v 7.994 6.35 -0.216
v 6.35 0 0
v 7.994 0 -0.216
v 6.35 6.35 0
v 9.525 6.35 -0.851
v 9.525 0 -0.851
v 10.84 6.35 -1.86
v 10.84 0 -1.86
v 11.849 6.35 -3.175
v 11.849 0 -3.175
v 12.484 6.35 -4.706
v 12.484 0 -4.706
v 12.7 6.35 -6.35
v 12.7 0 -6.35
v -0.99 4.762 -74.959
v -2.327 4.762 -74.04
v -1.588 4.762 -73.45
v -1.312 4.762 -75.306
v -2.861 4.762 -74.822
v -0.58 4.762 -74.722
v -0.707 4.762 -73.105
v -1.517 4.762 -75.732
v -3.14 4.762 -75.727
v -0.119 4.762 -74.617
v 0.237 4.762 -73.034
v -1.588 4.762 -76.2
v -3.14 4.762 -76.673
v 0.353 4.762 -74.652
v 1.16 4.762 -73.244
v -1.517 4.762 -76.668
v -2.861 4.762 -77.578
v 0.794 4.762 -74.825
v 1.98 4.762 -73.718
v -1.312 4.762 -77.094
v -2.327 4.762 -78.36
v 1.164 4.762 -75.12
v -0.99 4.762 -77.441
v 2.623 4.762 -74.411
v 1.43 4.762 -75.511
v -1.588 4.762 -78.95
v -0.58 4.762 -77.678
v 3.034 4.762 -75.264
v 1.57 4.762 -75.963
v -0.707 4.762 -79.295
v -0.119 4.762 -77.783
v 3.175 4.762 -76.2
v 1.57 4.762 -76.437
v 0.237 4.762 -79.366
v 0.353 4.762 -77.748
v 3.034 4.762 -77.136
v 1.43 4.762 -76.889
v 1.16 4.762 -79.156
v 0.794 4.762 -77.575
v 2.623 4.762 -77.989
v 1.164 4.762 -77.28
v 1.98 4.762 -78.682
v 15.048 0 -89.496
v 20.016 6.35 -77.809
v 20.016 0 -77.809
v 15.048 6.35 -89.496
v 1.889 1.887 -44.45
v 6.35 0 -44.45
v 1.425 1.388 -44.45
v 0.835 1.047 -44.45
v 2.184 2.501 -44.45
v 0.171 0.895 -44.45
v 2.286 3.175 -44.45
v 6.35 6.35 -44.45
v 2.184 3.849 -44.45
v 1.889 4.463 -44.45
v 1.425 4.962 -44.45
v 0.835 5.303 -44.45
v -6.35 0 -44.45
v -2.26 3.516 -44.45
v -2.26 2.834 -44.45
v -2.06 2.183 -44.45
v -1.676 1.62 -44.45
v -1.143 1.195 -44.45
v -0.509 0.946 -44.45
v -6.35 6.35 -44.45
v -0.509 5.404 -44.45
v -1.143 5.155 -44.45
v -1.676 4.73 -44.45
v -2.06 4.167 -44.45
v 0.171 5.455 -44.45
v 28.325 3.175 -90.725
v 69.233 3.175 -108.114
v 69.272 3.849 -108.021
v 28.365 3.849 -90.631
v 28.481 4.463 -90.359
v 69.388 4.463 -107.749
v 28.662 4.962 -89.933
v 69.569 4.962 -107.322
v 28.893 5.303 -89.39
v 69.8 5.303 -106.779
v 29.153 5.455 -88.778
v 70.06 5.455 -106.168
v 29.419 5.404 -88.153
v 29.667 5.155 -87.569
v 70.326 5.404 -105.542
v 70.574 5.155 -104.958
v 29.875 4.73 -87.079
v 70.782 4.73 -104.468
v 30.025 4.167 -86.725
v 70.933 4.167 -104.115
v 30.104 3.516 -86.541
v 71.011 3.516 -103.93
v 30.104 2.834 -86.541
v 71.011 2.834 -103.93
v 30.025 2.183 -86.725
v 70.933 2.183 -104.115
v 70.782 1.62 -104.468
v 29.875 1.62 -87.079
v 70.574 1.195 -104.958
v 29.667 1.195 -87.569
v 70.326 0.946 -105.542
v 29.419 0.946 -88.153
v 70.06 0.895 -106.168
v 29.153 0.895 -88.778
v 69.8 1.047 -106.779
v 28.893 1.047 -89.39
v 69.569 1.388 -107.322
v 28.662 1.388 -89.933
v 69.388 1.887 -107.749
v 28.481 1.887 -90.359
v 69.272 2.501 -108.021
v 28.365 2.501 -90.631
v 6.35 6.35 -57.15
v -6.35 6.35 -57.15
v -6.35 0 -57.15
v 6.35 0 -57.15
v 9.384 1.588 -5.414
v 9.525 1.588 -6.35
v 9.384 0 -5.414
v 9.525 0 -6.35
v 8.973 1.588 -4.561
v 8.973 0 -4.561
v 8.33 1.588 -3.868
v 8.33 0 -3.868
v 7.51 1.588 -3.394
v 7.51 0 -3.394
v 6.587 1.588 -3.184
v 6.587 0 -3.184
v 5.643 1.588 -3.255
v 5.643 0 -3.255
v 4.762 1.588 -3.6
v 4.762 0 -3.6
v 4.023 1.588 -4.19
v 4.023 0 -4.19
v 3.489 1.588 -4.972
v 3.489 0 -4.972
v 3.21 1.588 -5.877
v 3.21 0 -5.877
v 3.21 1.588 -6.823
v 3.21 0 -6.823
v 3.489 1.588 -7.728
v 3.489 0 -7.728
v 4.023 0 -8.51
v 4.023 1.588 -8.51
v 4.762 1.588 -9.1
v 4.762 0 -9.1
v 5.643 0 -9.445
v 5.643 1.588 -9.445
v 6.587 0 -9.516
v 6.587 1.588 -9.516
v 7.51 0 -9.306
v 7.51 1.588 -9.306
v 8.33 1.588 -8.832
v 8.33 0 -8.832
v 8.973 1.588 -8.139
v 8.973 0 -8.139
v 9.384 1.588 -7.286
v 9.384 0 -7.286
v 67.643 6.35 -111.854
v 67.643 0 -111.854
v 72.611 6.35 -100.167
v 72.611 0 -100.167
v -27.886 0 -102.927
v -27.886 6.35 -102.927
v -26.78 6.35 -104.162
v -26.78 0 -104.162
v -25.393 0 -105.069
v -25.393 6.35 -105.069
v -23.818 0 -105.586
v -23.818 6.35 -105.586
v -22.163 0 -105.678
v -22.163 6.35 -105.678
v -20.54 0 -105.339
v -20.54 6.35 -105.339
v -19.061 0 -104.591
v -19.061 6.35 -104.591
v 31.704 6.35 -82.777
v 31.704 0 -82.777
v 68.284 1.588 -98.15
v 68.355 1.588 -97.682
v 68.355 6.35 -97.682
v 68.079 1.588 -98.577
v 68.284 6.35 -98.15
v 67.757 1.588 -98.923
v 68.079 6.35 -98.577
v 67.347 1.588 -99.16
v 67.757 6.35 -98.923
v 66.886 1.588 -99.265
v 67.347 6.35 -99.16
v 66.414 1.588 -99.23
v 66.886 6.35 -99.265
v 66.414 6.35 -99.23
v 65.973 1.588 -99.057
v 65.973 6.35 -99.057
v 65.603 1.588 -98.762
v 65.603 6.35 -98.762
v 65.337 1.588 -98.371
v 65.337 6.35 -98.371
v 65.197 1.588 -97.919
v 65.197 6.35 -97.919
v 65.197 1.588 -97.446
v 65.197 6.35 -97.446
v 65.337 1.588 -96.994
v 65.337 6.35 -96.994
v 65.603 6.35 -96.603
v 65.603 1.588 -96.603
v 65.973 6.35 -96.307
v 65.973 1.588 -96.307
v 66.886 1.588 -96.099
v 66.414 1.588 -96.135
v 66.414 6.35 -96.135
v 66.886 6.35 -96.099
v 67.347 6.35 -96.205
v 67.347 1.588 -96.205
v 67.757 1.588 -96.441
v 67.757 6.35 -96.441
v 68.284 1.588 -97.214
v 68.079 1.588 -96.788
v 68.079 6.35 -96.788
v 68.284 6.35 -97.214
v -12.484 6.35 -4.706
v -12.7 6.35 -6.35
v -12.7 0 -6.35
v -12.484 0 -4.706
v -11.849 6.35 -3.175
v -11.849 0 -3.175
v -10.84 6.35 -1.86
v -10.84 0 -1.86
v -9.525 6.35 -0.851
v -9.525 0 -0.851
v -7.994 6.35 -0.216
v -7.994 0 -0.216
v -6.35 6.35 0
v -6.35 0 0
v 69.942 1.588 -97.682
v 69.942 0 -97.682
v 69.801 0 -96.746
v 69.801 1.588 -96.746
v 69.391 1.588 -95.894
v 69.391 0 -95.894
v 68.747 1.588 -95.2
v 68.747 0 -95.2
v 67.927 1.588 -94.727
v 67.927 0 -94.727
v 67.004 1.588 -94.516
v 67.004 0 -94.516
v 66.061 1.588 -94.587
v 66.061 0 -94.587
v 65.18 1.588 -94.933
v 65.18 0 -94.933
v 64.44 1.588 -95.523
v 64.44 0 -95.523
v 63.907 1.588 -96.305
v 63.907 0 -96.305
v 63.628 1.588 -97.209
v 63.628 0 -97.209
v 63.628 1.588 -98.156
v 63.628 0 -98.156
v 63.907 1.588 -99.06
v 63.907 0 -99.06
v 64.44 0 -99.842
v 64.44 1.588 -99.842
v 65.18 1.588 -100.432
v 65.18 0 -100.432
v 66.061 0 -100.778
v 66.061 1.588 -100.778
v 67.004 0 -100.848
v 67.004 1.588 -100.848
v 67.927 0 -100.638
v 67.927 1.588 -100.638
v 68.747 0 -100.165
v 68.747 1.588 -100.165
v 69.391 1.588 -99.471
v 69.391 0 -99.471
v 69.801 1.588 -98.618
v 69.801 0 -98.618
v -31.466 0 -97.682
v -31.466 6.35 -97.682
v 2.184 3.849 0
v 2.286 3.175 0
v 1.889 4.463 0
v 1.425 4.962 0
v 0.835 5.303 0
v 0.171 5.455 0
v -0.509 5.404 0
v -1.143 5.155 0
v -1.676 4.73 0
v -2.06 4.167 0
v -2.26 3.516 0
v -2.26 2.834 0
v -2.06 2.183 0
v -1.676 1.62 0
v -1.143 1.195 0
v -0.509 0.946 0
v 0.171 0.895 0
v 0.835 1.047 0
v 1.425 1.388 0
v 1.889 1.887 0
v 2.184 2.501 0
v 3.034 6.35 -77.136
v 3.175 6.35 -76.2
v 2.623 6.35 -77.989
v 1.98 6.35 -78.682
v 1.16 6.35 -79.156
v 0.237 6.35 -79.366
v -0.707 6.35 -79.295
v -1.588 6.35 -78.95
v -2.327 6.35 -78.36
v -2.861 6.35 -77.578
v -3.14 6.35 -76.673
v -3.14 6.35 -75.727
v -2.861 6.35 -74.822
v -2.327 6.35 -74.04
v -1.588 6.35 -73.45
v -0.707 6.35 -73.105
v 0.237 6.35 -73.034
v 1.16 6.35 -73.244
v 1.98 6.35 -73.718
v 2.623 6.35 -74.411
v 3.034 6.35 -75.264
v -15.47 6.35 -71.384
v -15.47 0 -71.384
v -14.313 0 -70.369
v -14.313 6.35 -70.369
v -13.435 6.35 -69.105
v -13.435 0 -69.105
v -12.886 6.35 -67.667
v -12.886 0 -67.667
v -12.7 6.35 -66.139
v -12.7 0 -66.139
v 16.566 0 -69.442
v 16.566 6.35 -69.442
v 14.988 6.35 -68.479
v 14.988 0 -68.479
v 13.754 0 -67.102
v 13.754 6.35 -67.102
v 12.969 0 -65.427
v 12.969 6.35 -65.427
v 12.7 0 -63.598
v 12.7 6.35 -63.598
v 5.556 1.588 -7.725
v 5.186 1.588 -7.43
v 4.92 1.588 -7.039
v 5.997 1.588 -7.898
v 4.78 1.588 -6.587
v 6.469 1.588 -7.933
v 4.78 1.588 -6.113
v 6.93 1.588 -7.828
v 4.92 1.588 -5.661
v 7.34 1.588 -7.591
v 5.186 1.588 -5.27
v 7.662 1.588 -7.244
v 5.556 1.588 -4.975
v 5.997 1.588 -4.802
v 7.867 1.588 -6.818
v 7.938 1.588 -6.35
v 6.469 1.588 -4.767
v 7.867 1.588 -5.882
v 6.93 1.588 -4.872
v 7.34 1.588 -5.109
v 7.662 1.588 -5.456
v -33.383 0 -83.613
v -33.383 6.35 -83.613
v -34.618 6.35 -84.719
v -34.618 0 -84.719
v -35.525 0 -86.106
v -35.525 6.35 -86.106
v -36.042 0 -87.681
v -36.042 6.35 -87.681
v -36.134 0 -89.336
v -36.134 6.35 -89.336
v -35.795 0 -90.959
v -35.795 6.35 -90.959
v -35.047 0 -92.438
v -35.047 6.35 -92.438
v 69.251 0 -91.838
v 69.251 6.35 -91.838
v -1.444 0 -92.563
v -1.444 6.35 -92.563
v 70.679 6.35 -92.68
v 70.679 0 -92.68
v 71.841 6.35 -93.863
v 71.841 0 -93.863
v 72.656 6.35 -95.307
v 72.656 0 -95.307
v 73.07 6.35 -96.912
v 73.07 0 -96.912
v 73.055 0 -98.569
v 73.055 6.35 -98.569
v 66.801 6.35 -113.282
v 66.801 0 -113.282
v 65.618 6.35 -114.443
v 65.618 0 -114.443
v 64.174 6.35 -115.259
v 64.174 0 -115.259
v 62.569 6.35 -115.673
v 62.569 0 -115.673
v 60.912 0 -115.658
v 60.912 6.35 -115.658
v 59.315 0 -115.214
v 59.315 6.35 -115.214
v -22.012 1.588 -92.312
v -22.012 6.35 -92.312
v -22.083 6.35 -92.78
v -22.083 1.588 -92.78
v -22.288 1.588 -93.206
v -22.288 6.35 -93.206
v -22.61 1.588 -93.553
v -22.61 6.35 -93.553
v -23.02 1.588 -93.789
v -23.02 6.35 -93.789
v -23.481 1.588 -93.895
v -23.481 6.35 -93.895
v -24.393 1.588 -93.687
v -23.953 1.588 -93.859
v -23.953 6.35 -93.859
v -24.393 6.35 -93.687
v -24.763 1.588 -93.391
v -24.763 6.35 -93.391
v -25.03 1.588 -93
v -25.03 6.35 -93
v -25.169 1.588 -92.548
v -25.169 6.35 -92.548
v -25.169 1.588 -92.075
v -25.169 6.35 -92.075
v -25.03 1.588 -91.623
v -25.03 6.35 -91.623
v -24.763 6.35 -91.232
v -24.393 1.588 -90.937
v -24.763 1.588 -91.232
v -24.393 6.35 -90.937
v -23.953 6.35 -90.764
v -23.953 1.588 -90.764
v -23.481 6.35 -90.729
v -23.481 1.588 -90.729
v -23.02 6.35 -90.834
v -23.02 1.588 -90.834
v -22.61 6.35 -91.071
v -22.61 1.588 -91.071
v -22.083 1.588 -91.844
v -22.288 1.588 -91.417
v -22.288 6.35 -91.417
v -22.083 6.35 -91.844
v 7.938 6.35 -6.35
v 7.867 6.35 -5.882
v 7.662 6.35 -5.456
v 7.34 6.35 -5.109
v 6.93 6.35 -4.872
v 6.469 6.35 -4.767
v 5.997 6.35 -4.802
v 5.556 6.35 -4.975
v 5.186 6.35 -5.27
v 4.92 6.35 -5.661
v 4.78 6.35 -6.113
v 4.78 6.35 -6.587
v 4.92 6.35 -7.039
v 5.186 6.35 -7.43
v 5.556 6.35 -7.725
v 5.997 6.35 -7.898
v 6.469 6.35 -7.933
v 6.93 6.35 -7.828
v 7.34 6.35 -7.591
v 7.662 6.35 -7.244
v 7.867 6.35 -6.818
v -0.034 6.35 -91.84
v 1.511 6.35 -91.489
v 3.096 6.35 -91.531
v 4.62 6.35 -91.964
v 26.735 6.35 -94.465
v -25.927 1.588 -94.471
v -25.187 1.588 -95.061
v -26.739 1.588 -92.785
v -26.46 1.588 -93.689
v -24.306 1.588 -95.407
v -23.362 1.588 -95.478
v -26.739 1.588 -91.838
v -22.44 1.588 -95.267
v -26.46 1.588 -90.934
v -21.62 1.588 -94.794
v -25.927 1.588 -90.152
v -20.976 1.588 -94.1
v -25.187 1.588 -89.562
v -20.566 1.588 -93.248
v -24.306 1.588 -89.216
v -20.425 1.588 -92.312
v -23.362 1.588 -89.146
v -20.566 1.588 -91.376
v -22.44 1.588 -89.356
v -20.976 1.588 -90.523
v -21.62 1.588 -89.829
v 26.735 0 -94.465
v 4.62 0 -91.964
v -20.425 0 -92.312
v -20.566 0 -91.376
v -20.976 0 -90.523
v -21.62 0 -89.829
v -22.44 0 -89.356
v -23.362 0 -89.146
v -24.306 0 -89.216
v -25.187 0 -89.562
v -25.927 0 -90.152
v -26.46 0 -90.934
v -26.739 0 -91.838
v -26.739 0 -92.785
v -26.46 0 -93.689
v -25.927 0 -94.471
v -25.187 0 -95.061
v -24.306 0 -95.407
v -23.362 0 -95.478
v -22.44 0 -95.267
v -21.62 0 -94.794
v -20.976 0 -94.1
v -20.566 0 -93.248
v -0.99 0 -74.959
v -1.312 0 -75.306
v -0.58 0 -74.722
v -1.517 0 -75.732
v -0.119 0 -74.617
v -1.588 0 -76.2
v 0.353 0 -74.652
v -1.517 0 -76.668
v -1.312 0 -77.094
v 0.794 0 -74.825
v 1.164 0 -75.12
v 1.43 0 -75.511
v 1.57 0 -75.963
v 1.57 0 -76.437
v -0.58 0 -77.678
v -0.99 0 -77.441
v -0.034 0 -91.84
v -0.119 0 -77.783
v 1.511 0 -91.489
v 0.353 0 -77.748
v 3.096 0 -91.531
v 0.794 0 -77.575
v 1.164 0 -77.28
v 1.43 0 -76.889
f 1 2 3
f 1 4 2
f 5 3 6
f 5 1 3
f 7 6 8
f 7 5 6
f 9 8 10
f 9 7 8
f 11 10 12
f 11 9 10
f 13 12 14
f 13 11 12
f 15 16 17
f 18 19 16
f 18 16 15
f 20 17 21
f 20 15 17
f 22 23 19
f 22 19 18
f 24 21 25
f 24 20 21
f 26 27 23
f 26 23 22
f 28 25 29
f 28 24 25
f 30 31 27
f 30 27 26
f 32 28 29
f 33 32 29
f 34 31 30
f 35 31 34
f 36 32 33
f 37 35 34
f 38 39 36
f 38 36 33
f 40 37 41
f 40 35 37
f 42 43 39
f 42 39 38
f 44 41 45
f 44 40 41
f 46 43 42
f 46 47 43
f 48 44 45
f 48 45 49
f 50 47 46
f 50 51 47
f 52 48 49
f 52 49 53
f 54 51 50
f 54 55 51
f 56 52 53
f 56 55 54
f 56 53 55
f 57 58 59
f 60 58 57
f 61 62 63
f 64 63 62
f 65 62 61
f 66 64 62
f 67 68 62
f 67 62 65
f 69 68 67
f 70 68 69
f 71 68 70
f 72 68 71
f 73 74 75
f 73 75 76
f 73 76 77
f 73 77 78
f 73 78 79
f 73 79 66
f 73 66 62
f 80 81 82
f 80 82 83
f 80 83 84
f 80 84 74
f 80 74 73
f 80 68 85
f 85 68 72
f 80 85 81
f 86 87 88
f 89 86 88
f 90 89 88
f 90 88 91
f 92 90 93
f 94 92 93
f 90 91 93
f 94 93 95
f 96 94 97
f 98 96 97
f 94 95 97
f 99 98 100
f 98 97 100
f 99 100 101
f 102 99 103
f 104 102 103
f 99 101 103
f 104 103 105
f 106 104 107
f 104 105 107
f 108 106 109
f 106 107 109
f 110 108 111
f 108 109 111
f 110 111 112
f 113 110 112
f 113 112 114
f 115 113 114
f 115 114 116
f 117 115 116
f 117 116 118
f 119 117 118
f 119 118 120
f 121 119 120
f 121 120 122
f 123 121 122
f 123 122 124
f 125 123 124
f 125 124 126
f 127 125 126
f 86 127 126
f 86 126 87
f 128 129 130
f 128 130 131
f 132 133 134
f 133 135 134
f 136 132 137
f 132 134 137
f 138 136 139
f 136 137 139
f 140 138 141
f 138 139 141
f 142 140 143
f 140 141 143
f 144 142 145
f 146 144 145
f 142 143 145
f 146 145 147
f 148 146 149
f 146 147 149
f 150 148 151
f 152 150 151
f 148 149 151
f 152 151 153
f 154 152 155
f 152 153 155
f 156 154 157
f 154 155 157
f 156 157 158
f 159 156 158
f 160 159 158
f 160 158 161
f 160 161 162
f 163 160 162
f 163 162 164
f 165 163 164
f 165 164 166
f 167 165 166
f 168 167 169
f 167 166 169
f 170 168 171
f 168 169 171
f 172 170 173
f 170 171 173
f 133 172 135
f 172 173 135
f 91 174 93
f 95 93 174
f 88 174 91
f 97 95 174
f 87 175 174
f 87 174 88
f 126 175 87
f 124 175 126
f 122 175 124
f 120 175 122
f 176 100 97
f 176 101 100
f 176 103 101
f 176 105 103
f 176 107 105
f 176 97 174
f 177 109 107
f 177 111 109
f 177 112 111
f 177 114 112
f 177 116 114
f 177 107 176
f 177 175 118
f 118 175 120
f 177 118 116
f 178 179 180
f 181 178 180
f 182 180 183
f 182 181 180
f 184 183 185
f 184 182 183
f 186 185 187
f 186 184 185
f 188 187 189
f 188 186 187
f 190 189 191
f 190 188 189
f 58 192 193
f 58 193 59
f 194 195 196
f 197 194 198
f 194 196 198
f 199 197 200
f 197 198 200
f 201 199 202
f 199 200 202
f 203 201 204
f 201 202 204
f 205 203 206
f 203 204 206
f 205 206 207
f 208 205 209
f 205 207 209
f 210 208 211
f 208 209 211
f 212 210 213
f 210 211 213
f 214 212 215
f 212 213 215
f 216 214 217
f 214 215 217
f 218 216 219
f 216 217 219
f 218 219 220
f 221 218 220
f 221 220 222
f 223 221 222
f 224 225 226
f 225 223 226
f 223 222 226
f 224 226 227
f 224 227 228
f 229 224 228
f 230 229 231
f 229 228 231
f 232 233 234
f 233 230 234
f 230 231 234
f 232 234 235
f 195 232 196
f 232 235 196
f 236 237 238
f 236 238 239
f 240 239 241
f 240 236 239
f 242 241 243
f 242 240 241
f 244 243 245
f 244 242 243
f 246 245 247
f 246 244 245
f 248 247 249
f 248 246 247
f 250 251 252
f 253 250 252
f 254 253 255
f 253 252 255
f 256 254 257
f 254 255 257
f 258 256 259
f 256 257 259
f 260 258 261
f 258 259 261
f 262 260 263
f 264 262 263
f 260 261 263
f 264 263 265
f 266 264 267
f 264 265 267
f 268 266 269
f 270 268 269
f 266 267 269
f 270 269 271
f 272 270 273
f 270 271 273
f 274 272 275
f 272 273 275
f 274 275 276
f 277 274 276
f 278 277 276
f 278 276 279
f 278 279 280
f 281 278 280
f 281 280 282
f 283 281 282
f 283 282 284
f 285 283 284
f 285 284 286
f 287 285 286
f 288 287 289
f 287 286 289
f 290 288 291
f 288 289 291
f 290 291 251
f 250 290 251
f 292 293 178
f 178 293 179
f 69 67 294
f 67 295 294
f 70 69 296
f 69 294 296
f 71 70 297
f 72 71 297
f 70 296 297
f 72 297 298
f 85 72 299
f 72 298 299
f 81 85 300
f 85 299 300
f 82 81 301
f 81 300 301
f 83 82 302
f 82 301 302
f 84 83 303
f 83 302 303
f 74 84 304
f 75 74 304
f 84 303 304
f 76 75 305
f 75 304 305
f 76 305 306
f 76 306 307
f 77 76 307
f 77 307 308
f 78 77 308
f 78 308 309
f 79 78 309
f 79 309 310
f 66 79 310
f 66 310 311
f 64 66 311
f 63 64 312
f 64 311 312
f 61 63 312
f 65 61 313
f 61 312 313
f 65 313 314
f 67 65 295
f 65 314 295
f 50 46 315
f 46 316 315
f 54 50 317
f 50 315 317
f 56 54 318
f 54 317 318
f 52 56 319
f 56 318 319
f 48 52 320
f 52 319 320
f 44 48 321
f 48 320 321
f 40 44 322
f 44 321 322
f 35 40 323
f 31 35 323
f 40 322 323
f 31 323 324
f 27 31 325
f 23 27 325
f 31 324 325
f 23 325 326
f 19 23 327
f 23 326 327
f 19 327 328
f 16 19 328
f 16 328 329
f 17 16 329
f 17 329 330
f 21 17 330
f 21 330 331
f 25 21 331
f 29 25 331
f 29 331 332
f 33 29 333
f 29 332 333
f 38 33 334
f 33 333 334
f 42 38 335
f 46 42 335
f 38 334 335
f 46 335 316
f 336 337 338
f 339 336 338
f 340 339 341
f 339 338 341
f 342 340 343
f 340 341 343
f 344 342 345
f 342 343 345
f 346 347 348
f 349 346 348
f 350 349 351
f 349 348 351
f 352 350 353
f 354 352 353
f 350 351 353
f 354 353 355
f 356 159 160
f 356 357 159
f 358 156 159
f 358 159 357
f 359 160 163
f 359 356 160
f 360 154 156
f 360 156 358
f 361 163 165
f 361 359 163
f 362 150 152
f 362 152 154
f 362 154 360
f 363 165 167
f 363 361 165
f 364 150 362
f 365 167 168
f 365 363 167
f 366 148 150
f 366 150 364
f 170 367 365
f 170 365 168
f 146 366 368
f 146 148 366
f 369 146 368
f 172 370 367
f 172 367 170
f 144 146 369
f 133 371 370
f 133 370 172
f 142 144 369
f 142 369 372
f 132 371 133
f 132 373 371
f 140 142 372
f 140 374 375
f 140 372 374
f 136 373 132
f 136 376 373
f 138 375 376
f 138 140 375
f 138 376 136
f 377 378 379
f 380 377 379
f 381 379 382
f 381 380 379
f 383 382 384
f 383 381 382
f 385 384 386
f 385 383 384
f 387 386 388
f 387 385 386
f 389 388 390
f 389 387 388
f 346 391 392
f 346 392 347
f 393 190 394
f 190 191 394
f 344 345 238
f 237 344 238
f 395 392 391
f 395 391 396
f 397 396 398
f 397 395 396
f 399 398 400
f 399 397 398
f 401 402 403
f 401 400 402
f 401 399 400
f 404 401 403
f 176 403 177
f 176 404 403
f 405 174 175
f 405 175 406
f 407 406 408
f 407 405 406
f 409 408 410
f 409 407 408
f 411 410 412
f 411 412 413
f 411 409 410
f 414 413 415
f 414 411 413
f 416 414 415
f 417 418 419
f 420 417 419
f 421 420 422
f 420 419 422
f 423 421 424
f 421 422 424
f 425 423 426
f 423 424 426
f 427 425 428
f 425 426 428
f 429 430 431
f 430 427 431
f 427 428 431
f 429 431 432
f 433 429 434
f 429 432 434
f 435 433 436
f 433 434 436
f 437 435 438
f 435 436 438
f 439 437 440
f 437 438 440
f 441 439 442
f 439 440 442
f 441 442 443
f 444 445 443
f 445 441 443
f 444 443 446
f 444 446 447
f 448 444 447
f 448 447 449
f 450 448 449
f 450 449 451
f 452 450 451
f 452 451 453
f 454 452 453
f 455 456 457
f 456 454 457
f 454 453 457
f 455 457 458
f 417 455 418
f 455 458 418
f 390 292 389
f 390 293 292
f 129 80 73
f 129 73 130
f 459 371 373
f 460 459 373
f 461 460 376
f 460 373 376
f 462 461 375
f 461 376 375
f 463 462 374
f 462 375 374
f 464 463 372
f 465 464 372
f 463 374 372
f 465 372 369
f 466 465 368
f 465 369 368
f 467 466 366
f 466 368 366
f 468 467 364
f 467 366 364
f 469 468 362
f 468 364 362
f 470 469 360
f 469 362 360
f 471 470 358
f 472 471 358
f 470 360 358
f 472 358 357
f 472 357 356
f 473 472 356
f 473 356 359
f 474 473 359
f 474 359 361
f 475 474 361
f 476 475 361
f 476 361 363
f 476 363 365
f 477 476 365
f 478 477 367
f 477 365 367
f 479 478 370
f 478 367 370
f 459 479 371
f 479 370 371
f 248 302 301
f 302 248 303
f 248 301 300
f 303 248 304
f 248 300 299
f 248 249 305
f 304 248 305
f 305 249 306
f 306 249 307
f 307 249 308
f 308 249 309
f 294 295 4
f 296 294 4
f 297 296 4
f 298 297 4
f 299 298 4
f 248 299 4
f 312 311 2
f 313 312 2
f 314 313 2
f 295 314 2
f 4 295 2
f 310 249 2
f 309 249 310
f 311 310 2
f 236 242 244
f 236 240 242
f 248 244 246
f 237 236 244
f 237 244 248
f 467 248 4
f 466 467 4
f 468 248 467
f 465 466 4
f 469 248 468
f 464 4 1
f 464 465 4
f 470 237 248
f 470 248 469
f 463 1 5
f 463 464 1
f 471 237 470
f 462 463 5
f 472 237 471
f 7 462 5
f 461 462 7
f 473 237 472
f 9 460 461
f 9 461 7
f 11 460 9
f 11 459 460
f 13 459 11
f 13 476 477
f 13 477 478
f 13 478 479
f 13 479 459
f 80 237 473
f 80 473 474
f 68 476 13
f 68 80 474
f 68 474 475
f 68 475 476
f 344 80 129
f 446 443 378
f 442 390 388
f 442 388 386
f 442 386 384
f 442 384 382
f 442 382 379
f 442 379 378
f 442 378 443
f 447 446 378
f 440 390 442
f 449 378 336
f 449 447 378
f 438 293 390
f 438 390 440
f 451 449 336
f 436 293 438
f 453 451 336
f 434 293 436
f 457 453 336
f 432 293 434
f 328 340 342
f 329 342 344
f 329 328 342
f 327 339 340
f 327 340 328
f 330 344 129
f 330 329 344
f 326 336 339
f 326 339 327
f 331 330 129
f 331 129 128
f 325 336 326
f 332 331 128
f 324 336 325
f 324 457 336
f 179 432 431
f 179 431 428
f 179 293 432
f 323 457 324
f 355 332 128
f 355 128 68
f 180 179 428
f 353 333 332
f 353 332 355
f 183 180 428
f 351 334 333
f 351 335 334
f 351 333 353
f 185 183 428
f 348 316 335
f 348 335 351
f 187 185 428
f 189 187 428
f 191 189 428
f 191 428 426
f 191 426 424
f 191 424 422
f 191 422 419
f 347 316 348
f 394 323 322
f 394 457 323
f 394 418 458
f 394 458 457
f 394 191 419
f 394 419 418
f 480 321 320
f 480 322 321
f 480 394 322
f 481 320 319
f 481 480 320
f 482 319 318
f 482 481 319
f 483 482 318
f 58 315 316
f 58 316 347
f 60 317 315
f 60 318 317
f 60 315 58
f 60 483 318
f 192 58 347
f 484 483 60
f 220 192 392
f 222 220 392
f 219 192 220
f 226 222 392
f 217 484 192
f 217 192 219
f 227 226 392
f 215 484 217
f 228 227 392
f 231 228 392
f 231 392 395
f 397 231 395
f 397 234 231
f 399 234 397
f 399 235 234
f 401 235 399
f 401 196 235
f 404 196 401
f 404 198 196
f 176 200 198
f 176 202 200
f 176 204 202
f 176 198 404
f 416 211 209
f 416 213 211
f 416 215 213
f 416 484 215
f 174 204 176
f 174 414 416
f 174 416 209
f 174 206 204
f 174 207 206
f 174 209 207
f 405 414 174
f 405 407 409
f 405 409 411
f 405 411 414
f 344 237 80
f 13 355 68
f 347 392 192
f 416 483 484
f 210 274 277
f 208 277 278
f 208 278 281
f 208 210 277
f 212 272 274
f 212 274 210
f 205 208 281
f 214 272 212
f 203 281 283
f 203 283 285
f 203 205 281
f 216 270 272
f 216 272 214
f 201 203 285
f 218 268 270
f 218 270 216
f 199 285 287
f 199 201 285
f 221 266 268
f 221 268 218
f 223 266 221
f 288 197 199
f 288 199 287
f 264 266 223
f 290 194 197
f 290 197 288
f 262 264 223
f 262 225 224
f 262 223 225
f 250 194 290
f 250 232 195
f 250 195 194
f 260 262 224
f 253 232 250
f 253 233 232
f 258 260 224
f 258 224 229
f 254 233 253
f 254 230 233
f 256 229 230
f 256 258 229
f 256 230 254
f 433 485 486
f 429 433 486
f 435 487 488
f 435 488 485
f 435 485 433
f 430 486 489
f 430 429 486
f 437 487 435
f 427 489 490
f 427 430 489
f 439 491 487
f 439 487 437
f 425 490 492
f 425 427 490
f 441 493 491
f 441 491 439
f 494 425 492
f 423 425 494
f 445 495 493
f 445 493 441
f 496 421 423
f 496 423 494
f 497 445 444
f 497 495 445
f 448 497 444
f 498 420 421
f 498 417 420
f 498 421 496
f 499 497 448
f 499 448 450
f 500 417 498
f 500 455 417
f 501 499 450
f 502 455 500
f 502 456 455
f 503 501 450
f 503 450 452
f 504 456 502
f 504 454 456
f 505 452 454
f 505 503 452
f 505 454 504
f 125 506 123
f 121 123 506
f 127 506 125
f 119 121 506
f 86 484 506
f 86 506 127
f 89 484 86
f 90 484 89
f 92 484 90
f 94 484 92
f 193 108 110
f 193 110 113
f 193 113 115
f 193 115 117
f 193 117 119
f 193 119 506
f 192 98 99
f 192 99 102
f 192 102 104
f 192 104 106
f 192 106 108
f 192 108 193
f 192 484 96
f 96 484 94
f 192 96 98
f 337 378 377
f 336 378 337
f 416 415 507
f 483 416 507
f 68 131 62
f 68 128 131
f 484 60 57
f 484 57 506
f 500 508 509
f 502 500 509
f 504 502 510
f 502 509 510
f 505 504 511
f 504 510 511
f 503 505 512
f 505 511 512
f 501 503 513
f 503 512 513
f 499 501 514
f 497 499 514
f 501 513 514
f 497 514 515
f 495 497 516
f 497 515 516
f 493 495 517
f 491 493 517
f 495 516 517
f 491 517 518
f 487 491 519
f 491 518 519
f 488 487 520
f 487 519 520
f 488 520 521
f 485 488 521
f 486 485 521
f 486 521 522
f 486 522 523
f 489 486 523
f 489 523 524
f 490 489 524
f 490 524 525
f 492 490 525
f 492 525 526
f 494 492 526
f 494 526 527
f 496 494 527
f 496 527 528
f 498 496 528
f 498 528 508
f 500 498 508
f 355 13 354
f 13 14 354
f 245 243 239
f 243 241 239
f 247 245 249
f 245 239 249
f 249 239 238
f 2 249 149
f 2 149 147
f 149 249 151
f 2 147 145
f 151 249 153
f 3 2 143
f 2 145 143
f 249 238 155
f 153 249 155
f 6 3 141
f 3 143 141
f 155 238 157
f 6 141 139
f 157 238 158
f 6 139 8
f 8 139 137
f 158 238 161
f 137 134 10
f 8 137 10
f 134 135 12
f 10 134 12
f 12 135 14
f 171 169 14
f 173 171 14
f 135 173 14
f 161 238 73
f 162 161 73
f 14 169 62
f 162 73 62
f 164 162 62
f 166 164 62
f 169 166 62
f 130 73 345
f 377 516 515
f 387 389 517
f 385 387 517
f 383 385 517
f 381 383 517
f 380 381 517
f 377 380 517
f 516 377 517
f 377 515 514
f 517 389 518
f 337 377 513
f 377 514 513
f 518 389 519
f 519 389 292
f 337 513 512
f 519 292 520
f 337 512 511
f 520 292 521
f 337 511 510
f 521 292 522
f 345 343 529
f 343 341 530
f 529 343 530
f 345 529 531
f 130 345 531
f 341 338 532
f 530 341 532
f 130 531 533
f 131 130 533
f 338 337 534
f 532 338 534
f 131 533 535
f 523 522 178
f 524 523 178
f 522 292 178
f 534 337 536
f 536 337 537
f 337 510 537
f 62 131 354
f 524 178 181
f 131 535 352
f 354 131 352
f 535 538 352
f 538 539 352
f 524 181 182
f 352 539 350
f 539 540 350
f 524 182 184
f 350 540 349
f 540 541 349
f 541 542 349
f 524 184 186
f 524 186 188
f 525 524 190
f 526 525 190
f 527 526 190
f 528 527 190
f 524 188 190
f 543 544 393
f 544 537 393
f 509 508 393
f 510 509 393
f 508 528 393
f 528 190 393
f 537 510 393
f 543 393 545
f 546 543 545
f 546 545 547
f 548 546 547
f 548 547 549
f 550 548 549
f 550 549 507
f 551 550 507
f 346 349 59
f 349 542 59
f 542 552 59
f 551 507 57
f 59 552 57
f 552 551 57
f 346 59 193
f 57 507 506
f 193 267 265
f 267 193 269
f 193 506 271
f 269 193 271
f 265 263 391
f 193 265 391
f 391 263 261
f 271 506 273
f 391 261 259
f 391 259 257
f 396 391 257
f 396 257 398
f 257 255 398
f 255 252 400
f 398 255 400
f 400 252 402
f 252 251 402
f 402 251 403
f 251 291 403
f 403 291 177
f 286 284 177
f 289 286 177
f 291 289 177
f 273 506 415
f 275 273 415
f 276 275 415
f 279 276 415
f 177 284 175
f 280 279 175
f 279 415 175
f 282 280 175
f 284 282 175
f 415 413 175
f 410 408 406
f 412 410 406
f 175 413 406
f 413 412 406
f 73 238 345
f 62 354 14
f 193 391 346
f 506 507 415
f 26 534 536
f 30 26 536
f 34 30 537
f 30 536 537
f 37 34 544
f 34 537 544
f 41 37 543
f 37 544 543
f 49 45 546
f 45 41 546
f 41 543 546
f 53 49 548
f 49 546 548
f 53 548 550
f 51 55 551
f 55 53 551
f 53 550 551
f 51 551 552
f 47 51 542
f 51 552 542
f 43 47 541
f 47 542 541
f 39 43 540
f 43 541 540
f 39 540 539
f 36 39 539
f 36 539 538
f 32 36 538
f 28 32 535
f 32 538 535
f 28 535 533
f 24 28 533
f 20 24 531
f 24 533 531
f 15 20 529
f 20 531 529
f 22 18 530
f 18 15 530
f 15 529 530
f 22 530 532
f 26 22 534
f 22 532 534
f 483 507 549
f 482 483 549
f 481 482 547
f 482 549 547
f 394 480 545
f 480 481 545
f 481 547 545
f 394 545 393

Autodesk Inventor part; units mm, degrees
ref_plane "YZ Plane" through (0, 0, 0) normal (1, 0, 0) x (0, 1, 0)
ref_plane "XZ Plane" through (0, 0, 0) normal (0, 1, 0) x (-1, 0, 0)
ref_plane "XY Plane" through (0, 0, 0) normal (0, 0, 1) x (1, 0, 0)
sketch "Sketch1" plane through (0, 0, 0) normal (0, 1, 0) x (-1, 0, 0)
  line L0 (0, -74.6125) -> (0, -76.2)
  line L1 (0, -76.2) -> (-1.461, -76.8211)
  line L2 (-70.1269, -106.0104) -> (-75.0953, -94.3226)
  line L3 (0, 0) -> (-12.7, 0)
  line L4 (0, 0) -> (12.7, 0)
  line L5 (-75.0953, -94.3226) -> (-12.7, -67.7988)
  line L6 (-12.7, 0) -> (-12.7, -67.7988)
  line L7 (-70.1269, -106.0104) -> (-65.1585, -117.6982)
  line L8 (-65.1585, -117.6982) -> (12.7, -84.6012)
  line L9 (12.7, -84.6012) -> (12.7, 0)
  circle A0 centre (0, -76.2) radius 1.5875
  dimension "d0" = 76.2
  dimension "d1" = 76.2
  dimension "d2" = 113.03
  dimension "d3" = 12.7
  dimension "d4" = 12.7
  dimension "d5" = 12.7
  dimension "d6" = 12.7
  dimension "d7" = 3.175
extrude "Extrusion1" add sketch "Sketch1" along normal blind 6.35
sketch "Sketch2" plane through (-12.7, 0, 0) normal (0, 0, 1) x (1, 0, 0)
  circle A0 centre (12.7, 3.175) radius 1.5875
  point P0 (12.7, 0)
  dimension "d10" = 3.175
extrude "Extrusion2" cut sketch "Sketch2" against normal blind 19.05
sketch "Sketch3" plane through (65.1585, 0, -117.6982) normal (0.9203001, 0, -0.3912131) x (-0.3912131, 0, -0.9203001)
  circle A0 centre (-12.7, 3.175) radius 1.5875
  point P0 (-82.8269, 0)
  dimension "d13" = 3.175
extrude "Extrusion3" cut sketch "Sketch3" against normal blind 19.05
fillet "Fillet1" radius 6.35 1 edges at (-12.7, 3.175, -84.6012)
fillet "Fillet2" radius 6.35 1 edges at (12.7, 3.175, -67.7988)
fillet "Fillet3" radius 6.35 1 edges at (65.1585, 3.175, -117.6982)
fillet "Fillet4" radius 6.35 1 edges at (75.0953, 3.175, -94.3226)
fillet "Fillet5" radius 6.35 1 edges at (12.7, 3.175, 0)
fillet "Fillet6" radius 6.35 1 edges at (-12.7, 3.175, 0)
sketch "Sketch4" plane through (0, 6.35, 0) normal (0, 1, 0) x (1, 0, 0)
  circle A0 centre (0, 76.2) radius 1.5875 projected
  circle A1 centre (0, 76.2) radius 3.175
  point P0 (0, 0)
  dimension "d22" = 6.35
extrude "Extrusion4" cut sketch "Sketch4" against normal blind 1.5875
sketch "Sketch5" plane through (0, 6.35, 0) normal (0, 1, 0) x (1, 0, 0)
  arc A0 (69.2514, 91.8384) -> (72.6111, 100.1665) centre (66.7672, 97.6823) ccw projected
  circle A1 centre (66.7672, 97.6823) radius 1.5875
  point P0 (0, 0)
  dimension "d25" = 3.175
extrude "Extrusion5" cut sketch "Sketch5" against normal blind 6.35
sketch "Sketch6" plane through (0, 0, 0) normal (0, -1, 0) x (1, 0, 0)
  circle A0 centre (66.7672, -97.6823) radius 1.5875 projected
  arc A1 (72.6111, -100.1665) -> (69.2514, -91.8384) centre (66.7672, -97.6823) ccw projected
  circle A2 centre (66.7672, -97.6823) radius 3.175
  point P0 (0, 0)
  dimension "d28" = 6.35
extrude "Extrusion6" cut sketch "Sketch6" against normal blind 1.5875
sketch "Sketch7" plane through (0, 0, 0) normal (0, -1, 0) x (1, 0, 0)
  arc A0 (12.7, -6.35) -> (6.35, 0) centre (6.35, -6.35) ccw projected
  circle A1 centre (6.35, -6.35) radius 1.5875
  point P0 (0, 0)
  dimension "d31" = 3.175
extrude "Extrusion7" cut sketch "Sketch7" against normal blind 6.35
sketch "Sketch8" plane through (0, 0, 0) normal (0, -1, 0) x (1, 0, 0)
  circle A0 centre (6.35, -6.35) radius 1.5875 projected
  arc A1 (12.7, -6.35) -> (6.35, 0) centre (6.35, -6.35) ccw projected
  circle A2 centre (6.35, -6.35) radius 3.175
  point P0 (0, 0)
  dimension "d34" = 6.35
extrude "Extrusion8" cut sketch "Sketch8" against normal blind 1.5875
sketch "Sketch9" plane through (0, 3.175, -19.05) normal (0, 0, 1) x (1, 0, 0)
  circle A0 centre (0, 0) radius 1.5875 projected
  point P0 (0, -3.175)
extrude "Extrusion9" cut sketch "Sketch9" against normal blind 31.75
sketch "Sketch10" plane through (52.5952, 3.175, -98.5578) normal (0.9203001, 0, -0.3912131) x (-0.3912131, 0, -0.9203001)
  circle A0 centre (0, 0) radius 1.5875 projected
  point P0 (-70.1269, -3.175)
extrude "Extrusion10" cut sketch "Sketch10" against normal blind 31.75
sketch "Sketch11" plane through (0, 6.35, 0) normal (0, 1, 0) x (1, 0, 0)
  line L0 (-12.7, 80.4006) -> (-12.7, 6.35) projected
  line L1 (0, 57.15) -> (6.35, 57.15)
  line L2 (6.35, 57.15) -> (6.35, 44.45)
  line L3 (6.35, 44.45) -> (-6.35, 44.45)
  line L4 (-6.35, 44.45) -> (-6.35, 57.15)
  line L5 (-6.35, 57.15) -> (0, 57.15)
  point P0 (0, 0)
  dimension "d41" = 6.35
  dimension "d42" = 12.7
  dimension "d43" = 12.7
  dimension "d44" = 12.7
extrude "Extrusion11" cut sketch "Sketch11" against normal blind 31.75
sketch "Sketch12" plane through (0, 6.35, 0) normal (0, 1, 0) x (1, 0, 0)
  line L0 (72.6111, 100.1665) -> (67.6427, 111.8543) projected
  line L1 (59.3146, 115.214) -> (-8.8342, 86.2445) projected
  line L2 (29.2195, 88.621) -> (17.5317, 83.6526)
  line L3 (17.5317, 83.6526) -> (15.0475, 89.4965)
  line L4 (15.0475, 89.4965) -> (26.7353, 94.4649)
  line L5 (26.7353, 94.4649) -> (31.7037, 82.7771)
  line L6 (31.7037, 82.7771) -> (20.0159, 77.8087)
  line L7 (20.0159, 77.8087) -> (17.5317, 83.6526)
  point P0 (0, 0)
  point P1 (70.1269, 106.0104)
  dimension "d47" = 57.15
  dimension "d48" = 6.35
  dimension "d49" = 12.7
  dimension "d50" = 12.7
  dimension "d51" = 12.7
extrude "Extrusion12" cut sketch "Sketch12" against normal blind 31.75 contours L5 L6 L7 L2
sketch "Sketch13" plane through (0, 6.35, 0) normal (0, 1, 0) x (1, 0, 0)
  line L0 (17.5317, 83.6526) -> (29.2195, 88.621) projected
  line L1 (59.3146, 115.214) -> (-8.8342, 86.2445) projected
  line L2 (17.5317, 83.6526) -> (15.0475, 89.4965)
  line L3 (15.0475, 89.4965) -> (26.7353, 94.4649)
  line L4 (26.7353, 94.4649) -> (29.2195, 88.621)
  point P0 (0, 0)
  dimension "d54" = 6.35
  dimension "d55" = 12.7
extrude "Extrusion13" cut sketch "Sketch13" against normal blind 31.75
sketch "Sketch14" plane through (6.35, 0, 0) normal (0, 0, 1) x (1, 0, 0)
  circle A0 centre (-6.35, 3.175) radius 1.5875 projected
  circle A1 centre (-6.35, 3.175) radius 2.286
  point P0 (-6.35, 0)
  dimension "d58" = 4.572
extrude "Extrusion14" cut sketch "Sketch14" against normal blind 44.45
sketch "Sketch15" plane through (67.6427, 0, -111.8543) normal (0.9203001, 0, -0.3912131) x (-0.3912131, 0, -0.9203001)
  circle A0 centre (-6.35, 3.175) radius 1.5875 projected
  circle A1 centre (-6.35, 3.175) radius 2.286
  point P0 (-76.4769, 0)
  dimension "d61" = 4.572
extrude "Extrusion15" cut sketch "Sketch15" against normal blind 44.45
sketch "Sketch16" plane through (0, 6.35, 0) normal (0, 1, 0) x (1, 0, 0)
  circle A0 centre (0, 76.2) radius 3.175 projected
  line L0 (59.3146, 115.214) -> (-8.8342, 86.2445) projected
  arc A1 (-8.8342, 86.2445) -> (-12.7, 80.4006) centre (-6.35, 80.4006) ccw projected
  line L1 (-12.7, 80.4006) -> (-12.7, 6.35) projected
  line L2 (-31.4662, 97.6823) -> (-24.3054, 108.171)
  line L3 (-24.3054, 108.171) -> (1.4241, 90.6052)
  line L4 (-31.4662, 97.6823) -> (-38.6269, 87.1936)
  line L5 (-38.6269, 87.1936) -> (-12.7, 69.493)
  line L6 (0, 76.2) -> (-2.6222, 77.9902)
  point P0 (0, 0)
  dimension "d64" = 38.1
  dimension "d65" = 12.7
  dimension "d66" = 12.7
extrude "Extrusion16" add sketch "Sketch16" against normal blind 6.35 contours L0 A1 L1 L5 L4 L2 L3
sketch "Sketch17" plane through (0, 6.35, 0) normal (0, 1, 0) x (1, 0, 0)
  line L0 (-24.3054, 108.171) -> (-38.6269, 87.1936) projected
  line L1 (-38.6269, 87.1936) -> (-12.7, 69.493) projected
  line L2 (-31.4662, 97.6823) -> (-23.5996, 92.3117)
  circle A0 centre (-23.5996, 92.3117) radius 1.5875
  point P0 (0, 0)
  dimension "d69" = 9.525
  dimension "d70" = 3.175
extrude "Extrusion17" cut sketch "Sketch17" against normal blind 6.35
sketch "Sketch18" plane through (0, 6.35, 0) normal (0, 1, 0) x (1, 0, 0)
  circle A0 centre (-23.5996, 92.3117) radius 1.5875 projected
  line L0 (26.7353, 94.4649) -> (31.7037, 82.7771) projected
  line L1 (31.7037, 82.7771) -> (20.0159, 77.8087) projected
  line L2 (20.0159, 77.8087) -> (15.0475, 89.4965) projected
  line L3 (15.0475, 89.4965) -> (26.7353, 94.4649) projected
  line L4 (-6.35, 44.45) -> (-6.35, 57.15) projected
  line L5 (-6.35, 57.15) -> (6.35, 57.15) projected
  line L6 (6.35, 57.15) -> (6.35, 44.45) projected
  line L7 (6.35, 44.45) -> (-6.35, 44.45) projected
  circle A1 centre (6.35, 6.35) radius 1.5875 projected
  circle A2 centre (66.7672, 97.6823) radius 1.5875 projected
  circle A3 centre (0, 76.2) radius 3.175 projected
  arc A4 (-12.7, 6.35) -> (-6.35, 0) centre (-6.35, 6.35) ccw projected
  line L8 (-6.35, 0) -> (6.35, 0) projected
  arc A5 (6.35, 0) -> (12.7, 6.35) centre (6.35, 6.35) ccw projected
  line L9 (12.7, 6.35) -> (12.7, 63.5983) projected
  arc A6 (16.5658, 69.4422) -> (12.7, 63.5983) centre (19.05, 63.5983) ccw projected
  line L10 (16.5658, 69.4422) -> (69.2514, 91.8384) projected
  arc A7 (69.2514, 91.8384) -> (72.6111, 100.1665) centre (66.7672, 97.6823) ccw projected
  line L11 (72.6111, 100.1665) -> (67.6427, 111.8543) projected
  arc A8 (67.6427, 111.8543) -> (59.3146, 115.214) centre (61.7988, 109.3701) ccw projected
  line L12 (59.3146, 115.214) -> (1.4241, 90.6052) projected
  line L13 (1.4241, 90.6052) -> (-24.3054, 108.171) projected
  line L14 (-24.3054, 108.171) -> (-38.6269, 87.1936) projected
  line L15 (-38.6269, 87.1936) -> (-12.7, 69.493) projected
  line L16 (-12.7, 69.493) -> (-12.7, 6.35) projected
  point P0 (0, 0)
sketch "Sketch19" plane through (0, 0, 0) normal (0, -1, 0) x (1, 0, 0)
  circle A0 centre (-23.5996, -92.3117) radius 1.5875 projected
  circle A1 centre (-23.5996, -92.3117) radius 3.175
  point P0 (0, 0)
  dimension "d73" = 6.35
extrude "Extrusion18" cut sketch "Sketch19" against normal blind 1.5875
fillet "Fillet7" radius 6.35 1 edges at (-24.3054, 3.175, -108.171)
fillet "Fillet8" radius 6.35 1 edges at (-38.6269, 3.175, -87.1936)
fillet "Fillet9" radius 6.35 1 edges at (1.4241, 3.175, -90.6052)
fillet "Fillet10" radius 6.35 1 edges at (-12.7, 3.175, -69.493)
properties part number "Auto Steering Part"
